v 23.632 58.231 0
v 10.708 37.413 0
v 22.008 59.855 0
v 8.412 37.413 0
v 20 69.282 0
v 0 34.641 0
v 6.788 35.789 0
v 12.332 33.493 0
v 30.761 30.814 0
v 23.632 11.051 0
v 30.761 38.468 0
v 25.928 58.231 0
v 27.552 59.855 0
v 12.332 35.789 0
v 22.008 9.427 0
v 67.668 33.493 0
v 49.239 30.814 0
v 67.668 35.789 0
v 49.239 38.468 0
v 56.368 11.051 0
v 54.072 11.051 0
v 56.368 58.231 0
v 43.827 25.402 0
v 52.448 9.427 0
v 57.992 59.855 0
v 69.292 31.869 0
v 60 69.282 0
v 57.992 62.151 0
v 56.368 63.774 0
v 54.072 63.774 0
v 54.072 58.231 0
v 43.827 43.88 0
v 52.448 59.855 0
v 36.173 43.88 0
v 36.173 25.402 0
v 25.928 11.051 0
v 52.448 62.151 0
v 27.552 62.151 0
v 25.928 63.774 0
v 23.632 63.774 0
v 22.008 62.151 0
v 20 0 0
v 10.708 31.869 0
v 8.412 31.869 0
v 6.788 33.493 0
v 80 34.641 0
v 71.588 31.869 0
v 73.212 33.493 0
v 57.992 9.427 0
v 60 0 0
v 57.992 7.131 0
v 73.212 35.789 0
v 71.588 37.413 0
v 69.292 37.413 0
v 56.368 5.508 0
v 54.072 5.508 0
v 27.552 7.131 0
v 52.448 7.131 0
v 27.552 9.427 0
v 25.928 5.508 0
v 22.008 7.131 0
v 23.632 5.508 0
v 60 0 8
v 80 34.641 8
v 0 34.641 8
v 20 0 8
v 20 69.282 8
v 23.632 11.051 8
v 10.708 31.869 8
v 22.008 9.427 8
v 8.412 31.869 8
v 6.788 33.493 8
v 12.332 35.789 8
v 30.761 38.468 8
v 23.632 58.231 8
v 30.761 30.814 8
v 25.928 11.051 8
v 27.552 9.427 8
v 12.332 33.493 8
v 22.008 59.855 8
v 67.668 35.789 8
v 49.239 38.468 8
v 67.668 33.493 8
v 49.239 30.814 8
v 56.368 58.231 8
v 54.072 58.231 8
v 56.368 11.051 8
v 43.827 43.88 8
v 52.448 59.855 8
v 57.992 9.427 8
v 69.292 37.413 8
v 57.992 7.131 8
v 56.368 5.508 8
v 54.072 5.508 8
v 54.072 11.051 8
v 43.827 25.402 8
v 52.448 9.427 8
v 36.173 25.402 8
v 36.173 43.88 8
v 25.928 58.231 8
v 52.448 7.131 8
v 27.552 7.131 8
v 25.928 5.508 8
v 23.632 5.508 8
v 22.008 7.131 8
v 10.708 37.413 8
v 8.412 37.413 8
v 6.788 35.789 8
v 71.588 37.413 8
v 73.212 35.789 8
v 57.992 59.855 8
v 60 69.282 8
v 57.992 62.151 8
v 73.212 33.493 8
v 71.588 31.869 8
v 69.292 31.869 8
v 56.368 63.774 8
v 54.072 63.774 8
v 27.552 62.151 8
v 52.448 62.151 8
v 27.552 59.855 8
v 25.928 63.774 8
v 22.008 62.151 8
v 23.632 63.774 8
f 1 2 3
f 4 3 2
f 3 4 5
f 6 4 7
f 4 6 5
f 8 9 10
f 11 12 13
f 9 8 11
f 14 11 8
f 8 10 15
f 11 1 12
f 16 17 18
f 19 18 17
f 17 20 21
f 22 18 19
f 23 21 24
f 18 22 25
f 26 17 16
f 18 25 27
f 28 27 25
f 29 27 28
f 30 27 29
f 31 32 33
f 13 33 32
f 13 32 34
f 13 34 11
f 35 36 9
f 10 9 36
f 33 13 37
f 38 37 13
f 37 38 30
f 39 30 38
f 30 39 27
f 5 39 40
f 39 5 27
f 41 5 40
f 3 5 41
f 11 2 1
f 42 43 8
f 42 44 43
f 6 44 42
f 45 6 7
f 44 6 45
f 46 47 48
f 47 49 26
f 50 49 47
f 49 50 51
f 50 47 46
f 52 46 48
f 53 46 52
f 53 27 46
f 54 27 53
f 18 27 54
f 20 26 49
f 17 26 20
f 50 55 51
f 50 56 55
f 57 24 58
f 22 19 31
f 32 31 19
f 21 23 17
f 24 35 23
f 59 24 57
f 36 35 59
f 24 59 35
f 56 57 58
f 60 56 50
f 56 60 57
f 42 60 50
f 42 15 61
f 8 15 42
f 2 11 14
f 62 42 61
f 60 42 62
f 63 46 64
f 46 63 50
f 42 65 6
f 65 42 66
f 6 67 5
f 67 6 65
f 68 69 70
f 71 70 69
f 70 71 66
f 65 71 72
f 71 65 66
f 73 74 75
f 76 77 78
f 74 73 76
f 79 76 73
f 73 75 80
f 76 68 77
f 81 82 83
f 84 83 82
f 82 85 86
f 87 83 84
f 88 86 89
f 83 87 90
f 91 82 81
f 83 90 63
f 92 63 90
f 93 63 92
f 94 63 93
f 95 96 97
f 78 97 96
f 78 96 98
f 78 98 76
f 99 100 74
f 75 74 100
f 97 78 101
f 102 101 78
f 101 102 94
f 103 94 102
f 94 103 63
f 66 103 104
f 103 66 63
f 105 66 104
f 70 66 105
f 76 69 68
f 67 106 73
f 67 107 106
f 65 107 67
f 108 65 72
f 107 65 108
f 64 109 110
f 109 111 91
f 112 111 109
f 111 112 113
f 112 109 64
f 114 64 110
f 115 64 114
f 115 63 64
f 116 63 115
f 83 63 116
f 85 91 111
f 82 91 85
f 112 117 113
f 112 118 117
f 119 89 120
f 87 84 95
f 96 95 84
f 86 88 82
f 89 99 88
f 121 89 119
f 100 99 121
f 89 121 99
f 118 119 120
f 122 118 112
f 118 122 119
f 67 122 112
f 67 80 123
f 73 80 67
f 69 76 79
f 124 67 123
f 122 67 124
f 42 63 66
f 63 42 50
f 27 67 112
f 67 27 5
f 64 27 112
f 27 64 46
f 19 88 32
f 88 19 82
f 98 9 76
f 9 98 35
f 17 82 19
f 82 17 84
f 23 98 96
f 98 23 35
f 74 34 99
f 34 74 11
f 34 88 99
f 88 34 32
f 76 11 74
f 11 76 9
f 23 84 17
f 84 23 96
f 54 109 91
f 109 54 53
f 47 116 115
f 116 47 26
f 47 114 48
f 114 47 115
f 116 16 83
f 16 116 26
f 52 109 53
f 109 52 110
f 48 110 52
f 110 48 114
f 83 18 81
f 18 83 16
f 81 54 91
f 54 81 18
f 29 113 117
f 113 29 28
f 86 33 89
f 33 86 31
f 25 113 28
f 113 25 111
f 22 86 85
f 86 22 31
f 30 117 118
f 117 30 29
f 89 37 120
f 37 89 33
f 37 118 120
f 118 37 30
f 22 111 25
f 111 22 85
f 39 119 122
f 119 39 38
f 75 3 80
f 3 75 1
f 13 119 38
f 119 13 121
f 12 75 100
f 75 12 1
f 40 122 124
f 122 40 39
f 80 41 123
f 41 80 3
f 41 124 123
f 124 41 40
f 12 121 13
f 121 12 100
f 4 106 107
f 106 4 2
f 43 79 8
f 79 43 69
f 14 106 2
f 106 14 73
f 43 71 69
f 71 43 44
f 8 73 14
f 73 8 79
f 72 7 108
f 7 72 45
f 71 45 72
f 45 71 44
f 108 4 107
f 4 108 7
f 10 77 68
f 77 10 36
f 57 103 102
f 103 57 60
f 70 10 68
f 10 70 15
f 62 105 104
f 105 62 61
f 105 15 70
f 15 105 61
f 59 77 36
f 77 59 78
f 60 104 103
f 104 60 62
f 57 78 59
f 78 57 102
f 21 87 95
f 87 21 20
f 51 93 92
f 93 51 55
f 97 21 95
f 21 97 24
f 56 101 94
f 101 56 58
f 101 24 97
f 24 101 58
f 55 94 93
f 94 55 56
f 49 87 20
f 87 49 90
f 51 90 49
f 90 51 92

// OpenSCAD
$fn = 32;

// ----------------------------------------------------------------------
// Polygon plate: 6-gon R40, 6 bolt windows
// ----------------------------------------------------------------------

// --- parameters (mm) ---
sides = 6;                // number of polygon sides
plate_r = 40;             // circumscribed radius of the polygon
bore_r = 10;              // centre bore radius
bolts = 6;                // number of bolt windows
ring_r = 30.44;           // bolt-circle radius
bolt_r = 3;               // bolt window radius
plate_t = 8;              // plate thickness, Z (extrusion height)

plate_d = 2 * plate_r;  // circumscribed diameter
bore_d = 2 * bore_r;  // centre bore diameter
bolt_d = 2 * bolt_r;  // bolt window diameter
ring_d = 2 * ring_r;  // bolt-circle diameter

profile = [[80, 34.641], [60, 69.282], [20, 69.282], [0, 34.641], [20, 0], [60, 0]];  // primary outline, 6 points, counter clockwise
void_1 = [[49.239, 38.468], [43.827, 43.88], [36.173, 43.88], [30.761, 38.468], [30.761, 30.814], [36.173, 25.402], [43.827, 25.402], [49.239, 30.814]];  // centre bore, 8 points
void_2 = [[73.212, 35.789], [71.588, 37.413], [69.292, 37.413], [67.668, 35.789], [67.668, 33.493], [69.292, 31.869], [71.588, 31.869], [73.212, 33.493]];  // bolt window 1, 8 points
void_3 = [[57.992, 62.151], [56.368, 63.774], [54.072, 63.774], [52.448, 62.151], [52.448, 59.855], [54.072, 58.231], [56.368, 58.231], [57.992, 59.855]];  // bolt window 2, 8 points
void_4 = [[27.552, 62.151], [25.928, 63.774], [23.632, 63.774], [22.008, 62.151], [22.008, 59.855], [23.632, 58.231], [25.928, 58.231], [27.552, 59.855]];  // bolt window 3, 8 points
void_5 = [[12.332, 35.789], [10.708, 37.413], [8.412, 37.413], [6.788, 35.789], [6.788, 33.493], [8.412, 31.869], [10.708, 31.869], [12.332, 33.493]];  // bolt window 4, 8 points
void_6 = [[27.552, 9.427], [25.928, 11.051], [23.632, 11.051], [22.008, 9.427], [22.008, 7.131], [23.632, 5.508], [25.928, 5.508], [27.552, 7.131]];  // bolt window 5, 8 points
void_7 = [[57.992, 9.427], [56.368, 11.051], [54.072, 11.051], [52.448, 9.427], [52.448, 7.131], [54.072, 5.508], [56.368, 5.508], [57.992, 7.131]];  // bolt window 6, 8 points

// --- the one profile operation ---
difference() {
  linear_extrude(height = plate_t) polygon(points = profile);
  translate([0, 0, -1])
    linear_extrude(height = plate_t + 2) polygon(points = void_1);
  translate([0, 0, -1])
    linear_extrude(height = plate_t + 2) polygon(points = void_2);
  translate([0, 0, -1])
    linear_extrude(height = plate_t + 2) polygon(points = void_3);
  translate([0, 0, -1])
    linear_extrude(height = plate_t + 2) polygon(points = void_4);
  translate([0, 0, -1])
    linear_extrude(height = plate_t + 2) polygon(points = void_5);
  translate([0, 0, -1])
    linear_extrude(height = plate_t + 2) polygon(points = void_6);
  translate([0, 0, -1])
    linear_extrude(height = plate_t + 2) polygon(points = void_7);
}
